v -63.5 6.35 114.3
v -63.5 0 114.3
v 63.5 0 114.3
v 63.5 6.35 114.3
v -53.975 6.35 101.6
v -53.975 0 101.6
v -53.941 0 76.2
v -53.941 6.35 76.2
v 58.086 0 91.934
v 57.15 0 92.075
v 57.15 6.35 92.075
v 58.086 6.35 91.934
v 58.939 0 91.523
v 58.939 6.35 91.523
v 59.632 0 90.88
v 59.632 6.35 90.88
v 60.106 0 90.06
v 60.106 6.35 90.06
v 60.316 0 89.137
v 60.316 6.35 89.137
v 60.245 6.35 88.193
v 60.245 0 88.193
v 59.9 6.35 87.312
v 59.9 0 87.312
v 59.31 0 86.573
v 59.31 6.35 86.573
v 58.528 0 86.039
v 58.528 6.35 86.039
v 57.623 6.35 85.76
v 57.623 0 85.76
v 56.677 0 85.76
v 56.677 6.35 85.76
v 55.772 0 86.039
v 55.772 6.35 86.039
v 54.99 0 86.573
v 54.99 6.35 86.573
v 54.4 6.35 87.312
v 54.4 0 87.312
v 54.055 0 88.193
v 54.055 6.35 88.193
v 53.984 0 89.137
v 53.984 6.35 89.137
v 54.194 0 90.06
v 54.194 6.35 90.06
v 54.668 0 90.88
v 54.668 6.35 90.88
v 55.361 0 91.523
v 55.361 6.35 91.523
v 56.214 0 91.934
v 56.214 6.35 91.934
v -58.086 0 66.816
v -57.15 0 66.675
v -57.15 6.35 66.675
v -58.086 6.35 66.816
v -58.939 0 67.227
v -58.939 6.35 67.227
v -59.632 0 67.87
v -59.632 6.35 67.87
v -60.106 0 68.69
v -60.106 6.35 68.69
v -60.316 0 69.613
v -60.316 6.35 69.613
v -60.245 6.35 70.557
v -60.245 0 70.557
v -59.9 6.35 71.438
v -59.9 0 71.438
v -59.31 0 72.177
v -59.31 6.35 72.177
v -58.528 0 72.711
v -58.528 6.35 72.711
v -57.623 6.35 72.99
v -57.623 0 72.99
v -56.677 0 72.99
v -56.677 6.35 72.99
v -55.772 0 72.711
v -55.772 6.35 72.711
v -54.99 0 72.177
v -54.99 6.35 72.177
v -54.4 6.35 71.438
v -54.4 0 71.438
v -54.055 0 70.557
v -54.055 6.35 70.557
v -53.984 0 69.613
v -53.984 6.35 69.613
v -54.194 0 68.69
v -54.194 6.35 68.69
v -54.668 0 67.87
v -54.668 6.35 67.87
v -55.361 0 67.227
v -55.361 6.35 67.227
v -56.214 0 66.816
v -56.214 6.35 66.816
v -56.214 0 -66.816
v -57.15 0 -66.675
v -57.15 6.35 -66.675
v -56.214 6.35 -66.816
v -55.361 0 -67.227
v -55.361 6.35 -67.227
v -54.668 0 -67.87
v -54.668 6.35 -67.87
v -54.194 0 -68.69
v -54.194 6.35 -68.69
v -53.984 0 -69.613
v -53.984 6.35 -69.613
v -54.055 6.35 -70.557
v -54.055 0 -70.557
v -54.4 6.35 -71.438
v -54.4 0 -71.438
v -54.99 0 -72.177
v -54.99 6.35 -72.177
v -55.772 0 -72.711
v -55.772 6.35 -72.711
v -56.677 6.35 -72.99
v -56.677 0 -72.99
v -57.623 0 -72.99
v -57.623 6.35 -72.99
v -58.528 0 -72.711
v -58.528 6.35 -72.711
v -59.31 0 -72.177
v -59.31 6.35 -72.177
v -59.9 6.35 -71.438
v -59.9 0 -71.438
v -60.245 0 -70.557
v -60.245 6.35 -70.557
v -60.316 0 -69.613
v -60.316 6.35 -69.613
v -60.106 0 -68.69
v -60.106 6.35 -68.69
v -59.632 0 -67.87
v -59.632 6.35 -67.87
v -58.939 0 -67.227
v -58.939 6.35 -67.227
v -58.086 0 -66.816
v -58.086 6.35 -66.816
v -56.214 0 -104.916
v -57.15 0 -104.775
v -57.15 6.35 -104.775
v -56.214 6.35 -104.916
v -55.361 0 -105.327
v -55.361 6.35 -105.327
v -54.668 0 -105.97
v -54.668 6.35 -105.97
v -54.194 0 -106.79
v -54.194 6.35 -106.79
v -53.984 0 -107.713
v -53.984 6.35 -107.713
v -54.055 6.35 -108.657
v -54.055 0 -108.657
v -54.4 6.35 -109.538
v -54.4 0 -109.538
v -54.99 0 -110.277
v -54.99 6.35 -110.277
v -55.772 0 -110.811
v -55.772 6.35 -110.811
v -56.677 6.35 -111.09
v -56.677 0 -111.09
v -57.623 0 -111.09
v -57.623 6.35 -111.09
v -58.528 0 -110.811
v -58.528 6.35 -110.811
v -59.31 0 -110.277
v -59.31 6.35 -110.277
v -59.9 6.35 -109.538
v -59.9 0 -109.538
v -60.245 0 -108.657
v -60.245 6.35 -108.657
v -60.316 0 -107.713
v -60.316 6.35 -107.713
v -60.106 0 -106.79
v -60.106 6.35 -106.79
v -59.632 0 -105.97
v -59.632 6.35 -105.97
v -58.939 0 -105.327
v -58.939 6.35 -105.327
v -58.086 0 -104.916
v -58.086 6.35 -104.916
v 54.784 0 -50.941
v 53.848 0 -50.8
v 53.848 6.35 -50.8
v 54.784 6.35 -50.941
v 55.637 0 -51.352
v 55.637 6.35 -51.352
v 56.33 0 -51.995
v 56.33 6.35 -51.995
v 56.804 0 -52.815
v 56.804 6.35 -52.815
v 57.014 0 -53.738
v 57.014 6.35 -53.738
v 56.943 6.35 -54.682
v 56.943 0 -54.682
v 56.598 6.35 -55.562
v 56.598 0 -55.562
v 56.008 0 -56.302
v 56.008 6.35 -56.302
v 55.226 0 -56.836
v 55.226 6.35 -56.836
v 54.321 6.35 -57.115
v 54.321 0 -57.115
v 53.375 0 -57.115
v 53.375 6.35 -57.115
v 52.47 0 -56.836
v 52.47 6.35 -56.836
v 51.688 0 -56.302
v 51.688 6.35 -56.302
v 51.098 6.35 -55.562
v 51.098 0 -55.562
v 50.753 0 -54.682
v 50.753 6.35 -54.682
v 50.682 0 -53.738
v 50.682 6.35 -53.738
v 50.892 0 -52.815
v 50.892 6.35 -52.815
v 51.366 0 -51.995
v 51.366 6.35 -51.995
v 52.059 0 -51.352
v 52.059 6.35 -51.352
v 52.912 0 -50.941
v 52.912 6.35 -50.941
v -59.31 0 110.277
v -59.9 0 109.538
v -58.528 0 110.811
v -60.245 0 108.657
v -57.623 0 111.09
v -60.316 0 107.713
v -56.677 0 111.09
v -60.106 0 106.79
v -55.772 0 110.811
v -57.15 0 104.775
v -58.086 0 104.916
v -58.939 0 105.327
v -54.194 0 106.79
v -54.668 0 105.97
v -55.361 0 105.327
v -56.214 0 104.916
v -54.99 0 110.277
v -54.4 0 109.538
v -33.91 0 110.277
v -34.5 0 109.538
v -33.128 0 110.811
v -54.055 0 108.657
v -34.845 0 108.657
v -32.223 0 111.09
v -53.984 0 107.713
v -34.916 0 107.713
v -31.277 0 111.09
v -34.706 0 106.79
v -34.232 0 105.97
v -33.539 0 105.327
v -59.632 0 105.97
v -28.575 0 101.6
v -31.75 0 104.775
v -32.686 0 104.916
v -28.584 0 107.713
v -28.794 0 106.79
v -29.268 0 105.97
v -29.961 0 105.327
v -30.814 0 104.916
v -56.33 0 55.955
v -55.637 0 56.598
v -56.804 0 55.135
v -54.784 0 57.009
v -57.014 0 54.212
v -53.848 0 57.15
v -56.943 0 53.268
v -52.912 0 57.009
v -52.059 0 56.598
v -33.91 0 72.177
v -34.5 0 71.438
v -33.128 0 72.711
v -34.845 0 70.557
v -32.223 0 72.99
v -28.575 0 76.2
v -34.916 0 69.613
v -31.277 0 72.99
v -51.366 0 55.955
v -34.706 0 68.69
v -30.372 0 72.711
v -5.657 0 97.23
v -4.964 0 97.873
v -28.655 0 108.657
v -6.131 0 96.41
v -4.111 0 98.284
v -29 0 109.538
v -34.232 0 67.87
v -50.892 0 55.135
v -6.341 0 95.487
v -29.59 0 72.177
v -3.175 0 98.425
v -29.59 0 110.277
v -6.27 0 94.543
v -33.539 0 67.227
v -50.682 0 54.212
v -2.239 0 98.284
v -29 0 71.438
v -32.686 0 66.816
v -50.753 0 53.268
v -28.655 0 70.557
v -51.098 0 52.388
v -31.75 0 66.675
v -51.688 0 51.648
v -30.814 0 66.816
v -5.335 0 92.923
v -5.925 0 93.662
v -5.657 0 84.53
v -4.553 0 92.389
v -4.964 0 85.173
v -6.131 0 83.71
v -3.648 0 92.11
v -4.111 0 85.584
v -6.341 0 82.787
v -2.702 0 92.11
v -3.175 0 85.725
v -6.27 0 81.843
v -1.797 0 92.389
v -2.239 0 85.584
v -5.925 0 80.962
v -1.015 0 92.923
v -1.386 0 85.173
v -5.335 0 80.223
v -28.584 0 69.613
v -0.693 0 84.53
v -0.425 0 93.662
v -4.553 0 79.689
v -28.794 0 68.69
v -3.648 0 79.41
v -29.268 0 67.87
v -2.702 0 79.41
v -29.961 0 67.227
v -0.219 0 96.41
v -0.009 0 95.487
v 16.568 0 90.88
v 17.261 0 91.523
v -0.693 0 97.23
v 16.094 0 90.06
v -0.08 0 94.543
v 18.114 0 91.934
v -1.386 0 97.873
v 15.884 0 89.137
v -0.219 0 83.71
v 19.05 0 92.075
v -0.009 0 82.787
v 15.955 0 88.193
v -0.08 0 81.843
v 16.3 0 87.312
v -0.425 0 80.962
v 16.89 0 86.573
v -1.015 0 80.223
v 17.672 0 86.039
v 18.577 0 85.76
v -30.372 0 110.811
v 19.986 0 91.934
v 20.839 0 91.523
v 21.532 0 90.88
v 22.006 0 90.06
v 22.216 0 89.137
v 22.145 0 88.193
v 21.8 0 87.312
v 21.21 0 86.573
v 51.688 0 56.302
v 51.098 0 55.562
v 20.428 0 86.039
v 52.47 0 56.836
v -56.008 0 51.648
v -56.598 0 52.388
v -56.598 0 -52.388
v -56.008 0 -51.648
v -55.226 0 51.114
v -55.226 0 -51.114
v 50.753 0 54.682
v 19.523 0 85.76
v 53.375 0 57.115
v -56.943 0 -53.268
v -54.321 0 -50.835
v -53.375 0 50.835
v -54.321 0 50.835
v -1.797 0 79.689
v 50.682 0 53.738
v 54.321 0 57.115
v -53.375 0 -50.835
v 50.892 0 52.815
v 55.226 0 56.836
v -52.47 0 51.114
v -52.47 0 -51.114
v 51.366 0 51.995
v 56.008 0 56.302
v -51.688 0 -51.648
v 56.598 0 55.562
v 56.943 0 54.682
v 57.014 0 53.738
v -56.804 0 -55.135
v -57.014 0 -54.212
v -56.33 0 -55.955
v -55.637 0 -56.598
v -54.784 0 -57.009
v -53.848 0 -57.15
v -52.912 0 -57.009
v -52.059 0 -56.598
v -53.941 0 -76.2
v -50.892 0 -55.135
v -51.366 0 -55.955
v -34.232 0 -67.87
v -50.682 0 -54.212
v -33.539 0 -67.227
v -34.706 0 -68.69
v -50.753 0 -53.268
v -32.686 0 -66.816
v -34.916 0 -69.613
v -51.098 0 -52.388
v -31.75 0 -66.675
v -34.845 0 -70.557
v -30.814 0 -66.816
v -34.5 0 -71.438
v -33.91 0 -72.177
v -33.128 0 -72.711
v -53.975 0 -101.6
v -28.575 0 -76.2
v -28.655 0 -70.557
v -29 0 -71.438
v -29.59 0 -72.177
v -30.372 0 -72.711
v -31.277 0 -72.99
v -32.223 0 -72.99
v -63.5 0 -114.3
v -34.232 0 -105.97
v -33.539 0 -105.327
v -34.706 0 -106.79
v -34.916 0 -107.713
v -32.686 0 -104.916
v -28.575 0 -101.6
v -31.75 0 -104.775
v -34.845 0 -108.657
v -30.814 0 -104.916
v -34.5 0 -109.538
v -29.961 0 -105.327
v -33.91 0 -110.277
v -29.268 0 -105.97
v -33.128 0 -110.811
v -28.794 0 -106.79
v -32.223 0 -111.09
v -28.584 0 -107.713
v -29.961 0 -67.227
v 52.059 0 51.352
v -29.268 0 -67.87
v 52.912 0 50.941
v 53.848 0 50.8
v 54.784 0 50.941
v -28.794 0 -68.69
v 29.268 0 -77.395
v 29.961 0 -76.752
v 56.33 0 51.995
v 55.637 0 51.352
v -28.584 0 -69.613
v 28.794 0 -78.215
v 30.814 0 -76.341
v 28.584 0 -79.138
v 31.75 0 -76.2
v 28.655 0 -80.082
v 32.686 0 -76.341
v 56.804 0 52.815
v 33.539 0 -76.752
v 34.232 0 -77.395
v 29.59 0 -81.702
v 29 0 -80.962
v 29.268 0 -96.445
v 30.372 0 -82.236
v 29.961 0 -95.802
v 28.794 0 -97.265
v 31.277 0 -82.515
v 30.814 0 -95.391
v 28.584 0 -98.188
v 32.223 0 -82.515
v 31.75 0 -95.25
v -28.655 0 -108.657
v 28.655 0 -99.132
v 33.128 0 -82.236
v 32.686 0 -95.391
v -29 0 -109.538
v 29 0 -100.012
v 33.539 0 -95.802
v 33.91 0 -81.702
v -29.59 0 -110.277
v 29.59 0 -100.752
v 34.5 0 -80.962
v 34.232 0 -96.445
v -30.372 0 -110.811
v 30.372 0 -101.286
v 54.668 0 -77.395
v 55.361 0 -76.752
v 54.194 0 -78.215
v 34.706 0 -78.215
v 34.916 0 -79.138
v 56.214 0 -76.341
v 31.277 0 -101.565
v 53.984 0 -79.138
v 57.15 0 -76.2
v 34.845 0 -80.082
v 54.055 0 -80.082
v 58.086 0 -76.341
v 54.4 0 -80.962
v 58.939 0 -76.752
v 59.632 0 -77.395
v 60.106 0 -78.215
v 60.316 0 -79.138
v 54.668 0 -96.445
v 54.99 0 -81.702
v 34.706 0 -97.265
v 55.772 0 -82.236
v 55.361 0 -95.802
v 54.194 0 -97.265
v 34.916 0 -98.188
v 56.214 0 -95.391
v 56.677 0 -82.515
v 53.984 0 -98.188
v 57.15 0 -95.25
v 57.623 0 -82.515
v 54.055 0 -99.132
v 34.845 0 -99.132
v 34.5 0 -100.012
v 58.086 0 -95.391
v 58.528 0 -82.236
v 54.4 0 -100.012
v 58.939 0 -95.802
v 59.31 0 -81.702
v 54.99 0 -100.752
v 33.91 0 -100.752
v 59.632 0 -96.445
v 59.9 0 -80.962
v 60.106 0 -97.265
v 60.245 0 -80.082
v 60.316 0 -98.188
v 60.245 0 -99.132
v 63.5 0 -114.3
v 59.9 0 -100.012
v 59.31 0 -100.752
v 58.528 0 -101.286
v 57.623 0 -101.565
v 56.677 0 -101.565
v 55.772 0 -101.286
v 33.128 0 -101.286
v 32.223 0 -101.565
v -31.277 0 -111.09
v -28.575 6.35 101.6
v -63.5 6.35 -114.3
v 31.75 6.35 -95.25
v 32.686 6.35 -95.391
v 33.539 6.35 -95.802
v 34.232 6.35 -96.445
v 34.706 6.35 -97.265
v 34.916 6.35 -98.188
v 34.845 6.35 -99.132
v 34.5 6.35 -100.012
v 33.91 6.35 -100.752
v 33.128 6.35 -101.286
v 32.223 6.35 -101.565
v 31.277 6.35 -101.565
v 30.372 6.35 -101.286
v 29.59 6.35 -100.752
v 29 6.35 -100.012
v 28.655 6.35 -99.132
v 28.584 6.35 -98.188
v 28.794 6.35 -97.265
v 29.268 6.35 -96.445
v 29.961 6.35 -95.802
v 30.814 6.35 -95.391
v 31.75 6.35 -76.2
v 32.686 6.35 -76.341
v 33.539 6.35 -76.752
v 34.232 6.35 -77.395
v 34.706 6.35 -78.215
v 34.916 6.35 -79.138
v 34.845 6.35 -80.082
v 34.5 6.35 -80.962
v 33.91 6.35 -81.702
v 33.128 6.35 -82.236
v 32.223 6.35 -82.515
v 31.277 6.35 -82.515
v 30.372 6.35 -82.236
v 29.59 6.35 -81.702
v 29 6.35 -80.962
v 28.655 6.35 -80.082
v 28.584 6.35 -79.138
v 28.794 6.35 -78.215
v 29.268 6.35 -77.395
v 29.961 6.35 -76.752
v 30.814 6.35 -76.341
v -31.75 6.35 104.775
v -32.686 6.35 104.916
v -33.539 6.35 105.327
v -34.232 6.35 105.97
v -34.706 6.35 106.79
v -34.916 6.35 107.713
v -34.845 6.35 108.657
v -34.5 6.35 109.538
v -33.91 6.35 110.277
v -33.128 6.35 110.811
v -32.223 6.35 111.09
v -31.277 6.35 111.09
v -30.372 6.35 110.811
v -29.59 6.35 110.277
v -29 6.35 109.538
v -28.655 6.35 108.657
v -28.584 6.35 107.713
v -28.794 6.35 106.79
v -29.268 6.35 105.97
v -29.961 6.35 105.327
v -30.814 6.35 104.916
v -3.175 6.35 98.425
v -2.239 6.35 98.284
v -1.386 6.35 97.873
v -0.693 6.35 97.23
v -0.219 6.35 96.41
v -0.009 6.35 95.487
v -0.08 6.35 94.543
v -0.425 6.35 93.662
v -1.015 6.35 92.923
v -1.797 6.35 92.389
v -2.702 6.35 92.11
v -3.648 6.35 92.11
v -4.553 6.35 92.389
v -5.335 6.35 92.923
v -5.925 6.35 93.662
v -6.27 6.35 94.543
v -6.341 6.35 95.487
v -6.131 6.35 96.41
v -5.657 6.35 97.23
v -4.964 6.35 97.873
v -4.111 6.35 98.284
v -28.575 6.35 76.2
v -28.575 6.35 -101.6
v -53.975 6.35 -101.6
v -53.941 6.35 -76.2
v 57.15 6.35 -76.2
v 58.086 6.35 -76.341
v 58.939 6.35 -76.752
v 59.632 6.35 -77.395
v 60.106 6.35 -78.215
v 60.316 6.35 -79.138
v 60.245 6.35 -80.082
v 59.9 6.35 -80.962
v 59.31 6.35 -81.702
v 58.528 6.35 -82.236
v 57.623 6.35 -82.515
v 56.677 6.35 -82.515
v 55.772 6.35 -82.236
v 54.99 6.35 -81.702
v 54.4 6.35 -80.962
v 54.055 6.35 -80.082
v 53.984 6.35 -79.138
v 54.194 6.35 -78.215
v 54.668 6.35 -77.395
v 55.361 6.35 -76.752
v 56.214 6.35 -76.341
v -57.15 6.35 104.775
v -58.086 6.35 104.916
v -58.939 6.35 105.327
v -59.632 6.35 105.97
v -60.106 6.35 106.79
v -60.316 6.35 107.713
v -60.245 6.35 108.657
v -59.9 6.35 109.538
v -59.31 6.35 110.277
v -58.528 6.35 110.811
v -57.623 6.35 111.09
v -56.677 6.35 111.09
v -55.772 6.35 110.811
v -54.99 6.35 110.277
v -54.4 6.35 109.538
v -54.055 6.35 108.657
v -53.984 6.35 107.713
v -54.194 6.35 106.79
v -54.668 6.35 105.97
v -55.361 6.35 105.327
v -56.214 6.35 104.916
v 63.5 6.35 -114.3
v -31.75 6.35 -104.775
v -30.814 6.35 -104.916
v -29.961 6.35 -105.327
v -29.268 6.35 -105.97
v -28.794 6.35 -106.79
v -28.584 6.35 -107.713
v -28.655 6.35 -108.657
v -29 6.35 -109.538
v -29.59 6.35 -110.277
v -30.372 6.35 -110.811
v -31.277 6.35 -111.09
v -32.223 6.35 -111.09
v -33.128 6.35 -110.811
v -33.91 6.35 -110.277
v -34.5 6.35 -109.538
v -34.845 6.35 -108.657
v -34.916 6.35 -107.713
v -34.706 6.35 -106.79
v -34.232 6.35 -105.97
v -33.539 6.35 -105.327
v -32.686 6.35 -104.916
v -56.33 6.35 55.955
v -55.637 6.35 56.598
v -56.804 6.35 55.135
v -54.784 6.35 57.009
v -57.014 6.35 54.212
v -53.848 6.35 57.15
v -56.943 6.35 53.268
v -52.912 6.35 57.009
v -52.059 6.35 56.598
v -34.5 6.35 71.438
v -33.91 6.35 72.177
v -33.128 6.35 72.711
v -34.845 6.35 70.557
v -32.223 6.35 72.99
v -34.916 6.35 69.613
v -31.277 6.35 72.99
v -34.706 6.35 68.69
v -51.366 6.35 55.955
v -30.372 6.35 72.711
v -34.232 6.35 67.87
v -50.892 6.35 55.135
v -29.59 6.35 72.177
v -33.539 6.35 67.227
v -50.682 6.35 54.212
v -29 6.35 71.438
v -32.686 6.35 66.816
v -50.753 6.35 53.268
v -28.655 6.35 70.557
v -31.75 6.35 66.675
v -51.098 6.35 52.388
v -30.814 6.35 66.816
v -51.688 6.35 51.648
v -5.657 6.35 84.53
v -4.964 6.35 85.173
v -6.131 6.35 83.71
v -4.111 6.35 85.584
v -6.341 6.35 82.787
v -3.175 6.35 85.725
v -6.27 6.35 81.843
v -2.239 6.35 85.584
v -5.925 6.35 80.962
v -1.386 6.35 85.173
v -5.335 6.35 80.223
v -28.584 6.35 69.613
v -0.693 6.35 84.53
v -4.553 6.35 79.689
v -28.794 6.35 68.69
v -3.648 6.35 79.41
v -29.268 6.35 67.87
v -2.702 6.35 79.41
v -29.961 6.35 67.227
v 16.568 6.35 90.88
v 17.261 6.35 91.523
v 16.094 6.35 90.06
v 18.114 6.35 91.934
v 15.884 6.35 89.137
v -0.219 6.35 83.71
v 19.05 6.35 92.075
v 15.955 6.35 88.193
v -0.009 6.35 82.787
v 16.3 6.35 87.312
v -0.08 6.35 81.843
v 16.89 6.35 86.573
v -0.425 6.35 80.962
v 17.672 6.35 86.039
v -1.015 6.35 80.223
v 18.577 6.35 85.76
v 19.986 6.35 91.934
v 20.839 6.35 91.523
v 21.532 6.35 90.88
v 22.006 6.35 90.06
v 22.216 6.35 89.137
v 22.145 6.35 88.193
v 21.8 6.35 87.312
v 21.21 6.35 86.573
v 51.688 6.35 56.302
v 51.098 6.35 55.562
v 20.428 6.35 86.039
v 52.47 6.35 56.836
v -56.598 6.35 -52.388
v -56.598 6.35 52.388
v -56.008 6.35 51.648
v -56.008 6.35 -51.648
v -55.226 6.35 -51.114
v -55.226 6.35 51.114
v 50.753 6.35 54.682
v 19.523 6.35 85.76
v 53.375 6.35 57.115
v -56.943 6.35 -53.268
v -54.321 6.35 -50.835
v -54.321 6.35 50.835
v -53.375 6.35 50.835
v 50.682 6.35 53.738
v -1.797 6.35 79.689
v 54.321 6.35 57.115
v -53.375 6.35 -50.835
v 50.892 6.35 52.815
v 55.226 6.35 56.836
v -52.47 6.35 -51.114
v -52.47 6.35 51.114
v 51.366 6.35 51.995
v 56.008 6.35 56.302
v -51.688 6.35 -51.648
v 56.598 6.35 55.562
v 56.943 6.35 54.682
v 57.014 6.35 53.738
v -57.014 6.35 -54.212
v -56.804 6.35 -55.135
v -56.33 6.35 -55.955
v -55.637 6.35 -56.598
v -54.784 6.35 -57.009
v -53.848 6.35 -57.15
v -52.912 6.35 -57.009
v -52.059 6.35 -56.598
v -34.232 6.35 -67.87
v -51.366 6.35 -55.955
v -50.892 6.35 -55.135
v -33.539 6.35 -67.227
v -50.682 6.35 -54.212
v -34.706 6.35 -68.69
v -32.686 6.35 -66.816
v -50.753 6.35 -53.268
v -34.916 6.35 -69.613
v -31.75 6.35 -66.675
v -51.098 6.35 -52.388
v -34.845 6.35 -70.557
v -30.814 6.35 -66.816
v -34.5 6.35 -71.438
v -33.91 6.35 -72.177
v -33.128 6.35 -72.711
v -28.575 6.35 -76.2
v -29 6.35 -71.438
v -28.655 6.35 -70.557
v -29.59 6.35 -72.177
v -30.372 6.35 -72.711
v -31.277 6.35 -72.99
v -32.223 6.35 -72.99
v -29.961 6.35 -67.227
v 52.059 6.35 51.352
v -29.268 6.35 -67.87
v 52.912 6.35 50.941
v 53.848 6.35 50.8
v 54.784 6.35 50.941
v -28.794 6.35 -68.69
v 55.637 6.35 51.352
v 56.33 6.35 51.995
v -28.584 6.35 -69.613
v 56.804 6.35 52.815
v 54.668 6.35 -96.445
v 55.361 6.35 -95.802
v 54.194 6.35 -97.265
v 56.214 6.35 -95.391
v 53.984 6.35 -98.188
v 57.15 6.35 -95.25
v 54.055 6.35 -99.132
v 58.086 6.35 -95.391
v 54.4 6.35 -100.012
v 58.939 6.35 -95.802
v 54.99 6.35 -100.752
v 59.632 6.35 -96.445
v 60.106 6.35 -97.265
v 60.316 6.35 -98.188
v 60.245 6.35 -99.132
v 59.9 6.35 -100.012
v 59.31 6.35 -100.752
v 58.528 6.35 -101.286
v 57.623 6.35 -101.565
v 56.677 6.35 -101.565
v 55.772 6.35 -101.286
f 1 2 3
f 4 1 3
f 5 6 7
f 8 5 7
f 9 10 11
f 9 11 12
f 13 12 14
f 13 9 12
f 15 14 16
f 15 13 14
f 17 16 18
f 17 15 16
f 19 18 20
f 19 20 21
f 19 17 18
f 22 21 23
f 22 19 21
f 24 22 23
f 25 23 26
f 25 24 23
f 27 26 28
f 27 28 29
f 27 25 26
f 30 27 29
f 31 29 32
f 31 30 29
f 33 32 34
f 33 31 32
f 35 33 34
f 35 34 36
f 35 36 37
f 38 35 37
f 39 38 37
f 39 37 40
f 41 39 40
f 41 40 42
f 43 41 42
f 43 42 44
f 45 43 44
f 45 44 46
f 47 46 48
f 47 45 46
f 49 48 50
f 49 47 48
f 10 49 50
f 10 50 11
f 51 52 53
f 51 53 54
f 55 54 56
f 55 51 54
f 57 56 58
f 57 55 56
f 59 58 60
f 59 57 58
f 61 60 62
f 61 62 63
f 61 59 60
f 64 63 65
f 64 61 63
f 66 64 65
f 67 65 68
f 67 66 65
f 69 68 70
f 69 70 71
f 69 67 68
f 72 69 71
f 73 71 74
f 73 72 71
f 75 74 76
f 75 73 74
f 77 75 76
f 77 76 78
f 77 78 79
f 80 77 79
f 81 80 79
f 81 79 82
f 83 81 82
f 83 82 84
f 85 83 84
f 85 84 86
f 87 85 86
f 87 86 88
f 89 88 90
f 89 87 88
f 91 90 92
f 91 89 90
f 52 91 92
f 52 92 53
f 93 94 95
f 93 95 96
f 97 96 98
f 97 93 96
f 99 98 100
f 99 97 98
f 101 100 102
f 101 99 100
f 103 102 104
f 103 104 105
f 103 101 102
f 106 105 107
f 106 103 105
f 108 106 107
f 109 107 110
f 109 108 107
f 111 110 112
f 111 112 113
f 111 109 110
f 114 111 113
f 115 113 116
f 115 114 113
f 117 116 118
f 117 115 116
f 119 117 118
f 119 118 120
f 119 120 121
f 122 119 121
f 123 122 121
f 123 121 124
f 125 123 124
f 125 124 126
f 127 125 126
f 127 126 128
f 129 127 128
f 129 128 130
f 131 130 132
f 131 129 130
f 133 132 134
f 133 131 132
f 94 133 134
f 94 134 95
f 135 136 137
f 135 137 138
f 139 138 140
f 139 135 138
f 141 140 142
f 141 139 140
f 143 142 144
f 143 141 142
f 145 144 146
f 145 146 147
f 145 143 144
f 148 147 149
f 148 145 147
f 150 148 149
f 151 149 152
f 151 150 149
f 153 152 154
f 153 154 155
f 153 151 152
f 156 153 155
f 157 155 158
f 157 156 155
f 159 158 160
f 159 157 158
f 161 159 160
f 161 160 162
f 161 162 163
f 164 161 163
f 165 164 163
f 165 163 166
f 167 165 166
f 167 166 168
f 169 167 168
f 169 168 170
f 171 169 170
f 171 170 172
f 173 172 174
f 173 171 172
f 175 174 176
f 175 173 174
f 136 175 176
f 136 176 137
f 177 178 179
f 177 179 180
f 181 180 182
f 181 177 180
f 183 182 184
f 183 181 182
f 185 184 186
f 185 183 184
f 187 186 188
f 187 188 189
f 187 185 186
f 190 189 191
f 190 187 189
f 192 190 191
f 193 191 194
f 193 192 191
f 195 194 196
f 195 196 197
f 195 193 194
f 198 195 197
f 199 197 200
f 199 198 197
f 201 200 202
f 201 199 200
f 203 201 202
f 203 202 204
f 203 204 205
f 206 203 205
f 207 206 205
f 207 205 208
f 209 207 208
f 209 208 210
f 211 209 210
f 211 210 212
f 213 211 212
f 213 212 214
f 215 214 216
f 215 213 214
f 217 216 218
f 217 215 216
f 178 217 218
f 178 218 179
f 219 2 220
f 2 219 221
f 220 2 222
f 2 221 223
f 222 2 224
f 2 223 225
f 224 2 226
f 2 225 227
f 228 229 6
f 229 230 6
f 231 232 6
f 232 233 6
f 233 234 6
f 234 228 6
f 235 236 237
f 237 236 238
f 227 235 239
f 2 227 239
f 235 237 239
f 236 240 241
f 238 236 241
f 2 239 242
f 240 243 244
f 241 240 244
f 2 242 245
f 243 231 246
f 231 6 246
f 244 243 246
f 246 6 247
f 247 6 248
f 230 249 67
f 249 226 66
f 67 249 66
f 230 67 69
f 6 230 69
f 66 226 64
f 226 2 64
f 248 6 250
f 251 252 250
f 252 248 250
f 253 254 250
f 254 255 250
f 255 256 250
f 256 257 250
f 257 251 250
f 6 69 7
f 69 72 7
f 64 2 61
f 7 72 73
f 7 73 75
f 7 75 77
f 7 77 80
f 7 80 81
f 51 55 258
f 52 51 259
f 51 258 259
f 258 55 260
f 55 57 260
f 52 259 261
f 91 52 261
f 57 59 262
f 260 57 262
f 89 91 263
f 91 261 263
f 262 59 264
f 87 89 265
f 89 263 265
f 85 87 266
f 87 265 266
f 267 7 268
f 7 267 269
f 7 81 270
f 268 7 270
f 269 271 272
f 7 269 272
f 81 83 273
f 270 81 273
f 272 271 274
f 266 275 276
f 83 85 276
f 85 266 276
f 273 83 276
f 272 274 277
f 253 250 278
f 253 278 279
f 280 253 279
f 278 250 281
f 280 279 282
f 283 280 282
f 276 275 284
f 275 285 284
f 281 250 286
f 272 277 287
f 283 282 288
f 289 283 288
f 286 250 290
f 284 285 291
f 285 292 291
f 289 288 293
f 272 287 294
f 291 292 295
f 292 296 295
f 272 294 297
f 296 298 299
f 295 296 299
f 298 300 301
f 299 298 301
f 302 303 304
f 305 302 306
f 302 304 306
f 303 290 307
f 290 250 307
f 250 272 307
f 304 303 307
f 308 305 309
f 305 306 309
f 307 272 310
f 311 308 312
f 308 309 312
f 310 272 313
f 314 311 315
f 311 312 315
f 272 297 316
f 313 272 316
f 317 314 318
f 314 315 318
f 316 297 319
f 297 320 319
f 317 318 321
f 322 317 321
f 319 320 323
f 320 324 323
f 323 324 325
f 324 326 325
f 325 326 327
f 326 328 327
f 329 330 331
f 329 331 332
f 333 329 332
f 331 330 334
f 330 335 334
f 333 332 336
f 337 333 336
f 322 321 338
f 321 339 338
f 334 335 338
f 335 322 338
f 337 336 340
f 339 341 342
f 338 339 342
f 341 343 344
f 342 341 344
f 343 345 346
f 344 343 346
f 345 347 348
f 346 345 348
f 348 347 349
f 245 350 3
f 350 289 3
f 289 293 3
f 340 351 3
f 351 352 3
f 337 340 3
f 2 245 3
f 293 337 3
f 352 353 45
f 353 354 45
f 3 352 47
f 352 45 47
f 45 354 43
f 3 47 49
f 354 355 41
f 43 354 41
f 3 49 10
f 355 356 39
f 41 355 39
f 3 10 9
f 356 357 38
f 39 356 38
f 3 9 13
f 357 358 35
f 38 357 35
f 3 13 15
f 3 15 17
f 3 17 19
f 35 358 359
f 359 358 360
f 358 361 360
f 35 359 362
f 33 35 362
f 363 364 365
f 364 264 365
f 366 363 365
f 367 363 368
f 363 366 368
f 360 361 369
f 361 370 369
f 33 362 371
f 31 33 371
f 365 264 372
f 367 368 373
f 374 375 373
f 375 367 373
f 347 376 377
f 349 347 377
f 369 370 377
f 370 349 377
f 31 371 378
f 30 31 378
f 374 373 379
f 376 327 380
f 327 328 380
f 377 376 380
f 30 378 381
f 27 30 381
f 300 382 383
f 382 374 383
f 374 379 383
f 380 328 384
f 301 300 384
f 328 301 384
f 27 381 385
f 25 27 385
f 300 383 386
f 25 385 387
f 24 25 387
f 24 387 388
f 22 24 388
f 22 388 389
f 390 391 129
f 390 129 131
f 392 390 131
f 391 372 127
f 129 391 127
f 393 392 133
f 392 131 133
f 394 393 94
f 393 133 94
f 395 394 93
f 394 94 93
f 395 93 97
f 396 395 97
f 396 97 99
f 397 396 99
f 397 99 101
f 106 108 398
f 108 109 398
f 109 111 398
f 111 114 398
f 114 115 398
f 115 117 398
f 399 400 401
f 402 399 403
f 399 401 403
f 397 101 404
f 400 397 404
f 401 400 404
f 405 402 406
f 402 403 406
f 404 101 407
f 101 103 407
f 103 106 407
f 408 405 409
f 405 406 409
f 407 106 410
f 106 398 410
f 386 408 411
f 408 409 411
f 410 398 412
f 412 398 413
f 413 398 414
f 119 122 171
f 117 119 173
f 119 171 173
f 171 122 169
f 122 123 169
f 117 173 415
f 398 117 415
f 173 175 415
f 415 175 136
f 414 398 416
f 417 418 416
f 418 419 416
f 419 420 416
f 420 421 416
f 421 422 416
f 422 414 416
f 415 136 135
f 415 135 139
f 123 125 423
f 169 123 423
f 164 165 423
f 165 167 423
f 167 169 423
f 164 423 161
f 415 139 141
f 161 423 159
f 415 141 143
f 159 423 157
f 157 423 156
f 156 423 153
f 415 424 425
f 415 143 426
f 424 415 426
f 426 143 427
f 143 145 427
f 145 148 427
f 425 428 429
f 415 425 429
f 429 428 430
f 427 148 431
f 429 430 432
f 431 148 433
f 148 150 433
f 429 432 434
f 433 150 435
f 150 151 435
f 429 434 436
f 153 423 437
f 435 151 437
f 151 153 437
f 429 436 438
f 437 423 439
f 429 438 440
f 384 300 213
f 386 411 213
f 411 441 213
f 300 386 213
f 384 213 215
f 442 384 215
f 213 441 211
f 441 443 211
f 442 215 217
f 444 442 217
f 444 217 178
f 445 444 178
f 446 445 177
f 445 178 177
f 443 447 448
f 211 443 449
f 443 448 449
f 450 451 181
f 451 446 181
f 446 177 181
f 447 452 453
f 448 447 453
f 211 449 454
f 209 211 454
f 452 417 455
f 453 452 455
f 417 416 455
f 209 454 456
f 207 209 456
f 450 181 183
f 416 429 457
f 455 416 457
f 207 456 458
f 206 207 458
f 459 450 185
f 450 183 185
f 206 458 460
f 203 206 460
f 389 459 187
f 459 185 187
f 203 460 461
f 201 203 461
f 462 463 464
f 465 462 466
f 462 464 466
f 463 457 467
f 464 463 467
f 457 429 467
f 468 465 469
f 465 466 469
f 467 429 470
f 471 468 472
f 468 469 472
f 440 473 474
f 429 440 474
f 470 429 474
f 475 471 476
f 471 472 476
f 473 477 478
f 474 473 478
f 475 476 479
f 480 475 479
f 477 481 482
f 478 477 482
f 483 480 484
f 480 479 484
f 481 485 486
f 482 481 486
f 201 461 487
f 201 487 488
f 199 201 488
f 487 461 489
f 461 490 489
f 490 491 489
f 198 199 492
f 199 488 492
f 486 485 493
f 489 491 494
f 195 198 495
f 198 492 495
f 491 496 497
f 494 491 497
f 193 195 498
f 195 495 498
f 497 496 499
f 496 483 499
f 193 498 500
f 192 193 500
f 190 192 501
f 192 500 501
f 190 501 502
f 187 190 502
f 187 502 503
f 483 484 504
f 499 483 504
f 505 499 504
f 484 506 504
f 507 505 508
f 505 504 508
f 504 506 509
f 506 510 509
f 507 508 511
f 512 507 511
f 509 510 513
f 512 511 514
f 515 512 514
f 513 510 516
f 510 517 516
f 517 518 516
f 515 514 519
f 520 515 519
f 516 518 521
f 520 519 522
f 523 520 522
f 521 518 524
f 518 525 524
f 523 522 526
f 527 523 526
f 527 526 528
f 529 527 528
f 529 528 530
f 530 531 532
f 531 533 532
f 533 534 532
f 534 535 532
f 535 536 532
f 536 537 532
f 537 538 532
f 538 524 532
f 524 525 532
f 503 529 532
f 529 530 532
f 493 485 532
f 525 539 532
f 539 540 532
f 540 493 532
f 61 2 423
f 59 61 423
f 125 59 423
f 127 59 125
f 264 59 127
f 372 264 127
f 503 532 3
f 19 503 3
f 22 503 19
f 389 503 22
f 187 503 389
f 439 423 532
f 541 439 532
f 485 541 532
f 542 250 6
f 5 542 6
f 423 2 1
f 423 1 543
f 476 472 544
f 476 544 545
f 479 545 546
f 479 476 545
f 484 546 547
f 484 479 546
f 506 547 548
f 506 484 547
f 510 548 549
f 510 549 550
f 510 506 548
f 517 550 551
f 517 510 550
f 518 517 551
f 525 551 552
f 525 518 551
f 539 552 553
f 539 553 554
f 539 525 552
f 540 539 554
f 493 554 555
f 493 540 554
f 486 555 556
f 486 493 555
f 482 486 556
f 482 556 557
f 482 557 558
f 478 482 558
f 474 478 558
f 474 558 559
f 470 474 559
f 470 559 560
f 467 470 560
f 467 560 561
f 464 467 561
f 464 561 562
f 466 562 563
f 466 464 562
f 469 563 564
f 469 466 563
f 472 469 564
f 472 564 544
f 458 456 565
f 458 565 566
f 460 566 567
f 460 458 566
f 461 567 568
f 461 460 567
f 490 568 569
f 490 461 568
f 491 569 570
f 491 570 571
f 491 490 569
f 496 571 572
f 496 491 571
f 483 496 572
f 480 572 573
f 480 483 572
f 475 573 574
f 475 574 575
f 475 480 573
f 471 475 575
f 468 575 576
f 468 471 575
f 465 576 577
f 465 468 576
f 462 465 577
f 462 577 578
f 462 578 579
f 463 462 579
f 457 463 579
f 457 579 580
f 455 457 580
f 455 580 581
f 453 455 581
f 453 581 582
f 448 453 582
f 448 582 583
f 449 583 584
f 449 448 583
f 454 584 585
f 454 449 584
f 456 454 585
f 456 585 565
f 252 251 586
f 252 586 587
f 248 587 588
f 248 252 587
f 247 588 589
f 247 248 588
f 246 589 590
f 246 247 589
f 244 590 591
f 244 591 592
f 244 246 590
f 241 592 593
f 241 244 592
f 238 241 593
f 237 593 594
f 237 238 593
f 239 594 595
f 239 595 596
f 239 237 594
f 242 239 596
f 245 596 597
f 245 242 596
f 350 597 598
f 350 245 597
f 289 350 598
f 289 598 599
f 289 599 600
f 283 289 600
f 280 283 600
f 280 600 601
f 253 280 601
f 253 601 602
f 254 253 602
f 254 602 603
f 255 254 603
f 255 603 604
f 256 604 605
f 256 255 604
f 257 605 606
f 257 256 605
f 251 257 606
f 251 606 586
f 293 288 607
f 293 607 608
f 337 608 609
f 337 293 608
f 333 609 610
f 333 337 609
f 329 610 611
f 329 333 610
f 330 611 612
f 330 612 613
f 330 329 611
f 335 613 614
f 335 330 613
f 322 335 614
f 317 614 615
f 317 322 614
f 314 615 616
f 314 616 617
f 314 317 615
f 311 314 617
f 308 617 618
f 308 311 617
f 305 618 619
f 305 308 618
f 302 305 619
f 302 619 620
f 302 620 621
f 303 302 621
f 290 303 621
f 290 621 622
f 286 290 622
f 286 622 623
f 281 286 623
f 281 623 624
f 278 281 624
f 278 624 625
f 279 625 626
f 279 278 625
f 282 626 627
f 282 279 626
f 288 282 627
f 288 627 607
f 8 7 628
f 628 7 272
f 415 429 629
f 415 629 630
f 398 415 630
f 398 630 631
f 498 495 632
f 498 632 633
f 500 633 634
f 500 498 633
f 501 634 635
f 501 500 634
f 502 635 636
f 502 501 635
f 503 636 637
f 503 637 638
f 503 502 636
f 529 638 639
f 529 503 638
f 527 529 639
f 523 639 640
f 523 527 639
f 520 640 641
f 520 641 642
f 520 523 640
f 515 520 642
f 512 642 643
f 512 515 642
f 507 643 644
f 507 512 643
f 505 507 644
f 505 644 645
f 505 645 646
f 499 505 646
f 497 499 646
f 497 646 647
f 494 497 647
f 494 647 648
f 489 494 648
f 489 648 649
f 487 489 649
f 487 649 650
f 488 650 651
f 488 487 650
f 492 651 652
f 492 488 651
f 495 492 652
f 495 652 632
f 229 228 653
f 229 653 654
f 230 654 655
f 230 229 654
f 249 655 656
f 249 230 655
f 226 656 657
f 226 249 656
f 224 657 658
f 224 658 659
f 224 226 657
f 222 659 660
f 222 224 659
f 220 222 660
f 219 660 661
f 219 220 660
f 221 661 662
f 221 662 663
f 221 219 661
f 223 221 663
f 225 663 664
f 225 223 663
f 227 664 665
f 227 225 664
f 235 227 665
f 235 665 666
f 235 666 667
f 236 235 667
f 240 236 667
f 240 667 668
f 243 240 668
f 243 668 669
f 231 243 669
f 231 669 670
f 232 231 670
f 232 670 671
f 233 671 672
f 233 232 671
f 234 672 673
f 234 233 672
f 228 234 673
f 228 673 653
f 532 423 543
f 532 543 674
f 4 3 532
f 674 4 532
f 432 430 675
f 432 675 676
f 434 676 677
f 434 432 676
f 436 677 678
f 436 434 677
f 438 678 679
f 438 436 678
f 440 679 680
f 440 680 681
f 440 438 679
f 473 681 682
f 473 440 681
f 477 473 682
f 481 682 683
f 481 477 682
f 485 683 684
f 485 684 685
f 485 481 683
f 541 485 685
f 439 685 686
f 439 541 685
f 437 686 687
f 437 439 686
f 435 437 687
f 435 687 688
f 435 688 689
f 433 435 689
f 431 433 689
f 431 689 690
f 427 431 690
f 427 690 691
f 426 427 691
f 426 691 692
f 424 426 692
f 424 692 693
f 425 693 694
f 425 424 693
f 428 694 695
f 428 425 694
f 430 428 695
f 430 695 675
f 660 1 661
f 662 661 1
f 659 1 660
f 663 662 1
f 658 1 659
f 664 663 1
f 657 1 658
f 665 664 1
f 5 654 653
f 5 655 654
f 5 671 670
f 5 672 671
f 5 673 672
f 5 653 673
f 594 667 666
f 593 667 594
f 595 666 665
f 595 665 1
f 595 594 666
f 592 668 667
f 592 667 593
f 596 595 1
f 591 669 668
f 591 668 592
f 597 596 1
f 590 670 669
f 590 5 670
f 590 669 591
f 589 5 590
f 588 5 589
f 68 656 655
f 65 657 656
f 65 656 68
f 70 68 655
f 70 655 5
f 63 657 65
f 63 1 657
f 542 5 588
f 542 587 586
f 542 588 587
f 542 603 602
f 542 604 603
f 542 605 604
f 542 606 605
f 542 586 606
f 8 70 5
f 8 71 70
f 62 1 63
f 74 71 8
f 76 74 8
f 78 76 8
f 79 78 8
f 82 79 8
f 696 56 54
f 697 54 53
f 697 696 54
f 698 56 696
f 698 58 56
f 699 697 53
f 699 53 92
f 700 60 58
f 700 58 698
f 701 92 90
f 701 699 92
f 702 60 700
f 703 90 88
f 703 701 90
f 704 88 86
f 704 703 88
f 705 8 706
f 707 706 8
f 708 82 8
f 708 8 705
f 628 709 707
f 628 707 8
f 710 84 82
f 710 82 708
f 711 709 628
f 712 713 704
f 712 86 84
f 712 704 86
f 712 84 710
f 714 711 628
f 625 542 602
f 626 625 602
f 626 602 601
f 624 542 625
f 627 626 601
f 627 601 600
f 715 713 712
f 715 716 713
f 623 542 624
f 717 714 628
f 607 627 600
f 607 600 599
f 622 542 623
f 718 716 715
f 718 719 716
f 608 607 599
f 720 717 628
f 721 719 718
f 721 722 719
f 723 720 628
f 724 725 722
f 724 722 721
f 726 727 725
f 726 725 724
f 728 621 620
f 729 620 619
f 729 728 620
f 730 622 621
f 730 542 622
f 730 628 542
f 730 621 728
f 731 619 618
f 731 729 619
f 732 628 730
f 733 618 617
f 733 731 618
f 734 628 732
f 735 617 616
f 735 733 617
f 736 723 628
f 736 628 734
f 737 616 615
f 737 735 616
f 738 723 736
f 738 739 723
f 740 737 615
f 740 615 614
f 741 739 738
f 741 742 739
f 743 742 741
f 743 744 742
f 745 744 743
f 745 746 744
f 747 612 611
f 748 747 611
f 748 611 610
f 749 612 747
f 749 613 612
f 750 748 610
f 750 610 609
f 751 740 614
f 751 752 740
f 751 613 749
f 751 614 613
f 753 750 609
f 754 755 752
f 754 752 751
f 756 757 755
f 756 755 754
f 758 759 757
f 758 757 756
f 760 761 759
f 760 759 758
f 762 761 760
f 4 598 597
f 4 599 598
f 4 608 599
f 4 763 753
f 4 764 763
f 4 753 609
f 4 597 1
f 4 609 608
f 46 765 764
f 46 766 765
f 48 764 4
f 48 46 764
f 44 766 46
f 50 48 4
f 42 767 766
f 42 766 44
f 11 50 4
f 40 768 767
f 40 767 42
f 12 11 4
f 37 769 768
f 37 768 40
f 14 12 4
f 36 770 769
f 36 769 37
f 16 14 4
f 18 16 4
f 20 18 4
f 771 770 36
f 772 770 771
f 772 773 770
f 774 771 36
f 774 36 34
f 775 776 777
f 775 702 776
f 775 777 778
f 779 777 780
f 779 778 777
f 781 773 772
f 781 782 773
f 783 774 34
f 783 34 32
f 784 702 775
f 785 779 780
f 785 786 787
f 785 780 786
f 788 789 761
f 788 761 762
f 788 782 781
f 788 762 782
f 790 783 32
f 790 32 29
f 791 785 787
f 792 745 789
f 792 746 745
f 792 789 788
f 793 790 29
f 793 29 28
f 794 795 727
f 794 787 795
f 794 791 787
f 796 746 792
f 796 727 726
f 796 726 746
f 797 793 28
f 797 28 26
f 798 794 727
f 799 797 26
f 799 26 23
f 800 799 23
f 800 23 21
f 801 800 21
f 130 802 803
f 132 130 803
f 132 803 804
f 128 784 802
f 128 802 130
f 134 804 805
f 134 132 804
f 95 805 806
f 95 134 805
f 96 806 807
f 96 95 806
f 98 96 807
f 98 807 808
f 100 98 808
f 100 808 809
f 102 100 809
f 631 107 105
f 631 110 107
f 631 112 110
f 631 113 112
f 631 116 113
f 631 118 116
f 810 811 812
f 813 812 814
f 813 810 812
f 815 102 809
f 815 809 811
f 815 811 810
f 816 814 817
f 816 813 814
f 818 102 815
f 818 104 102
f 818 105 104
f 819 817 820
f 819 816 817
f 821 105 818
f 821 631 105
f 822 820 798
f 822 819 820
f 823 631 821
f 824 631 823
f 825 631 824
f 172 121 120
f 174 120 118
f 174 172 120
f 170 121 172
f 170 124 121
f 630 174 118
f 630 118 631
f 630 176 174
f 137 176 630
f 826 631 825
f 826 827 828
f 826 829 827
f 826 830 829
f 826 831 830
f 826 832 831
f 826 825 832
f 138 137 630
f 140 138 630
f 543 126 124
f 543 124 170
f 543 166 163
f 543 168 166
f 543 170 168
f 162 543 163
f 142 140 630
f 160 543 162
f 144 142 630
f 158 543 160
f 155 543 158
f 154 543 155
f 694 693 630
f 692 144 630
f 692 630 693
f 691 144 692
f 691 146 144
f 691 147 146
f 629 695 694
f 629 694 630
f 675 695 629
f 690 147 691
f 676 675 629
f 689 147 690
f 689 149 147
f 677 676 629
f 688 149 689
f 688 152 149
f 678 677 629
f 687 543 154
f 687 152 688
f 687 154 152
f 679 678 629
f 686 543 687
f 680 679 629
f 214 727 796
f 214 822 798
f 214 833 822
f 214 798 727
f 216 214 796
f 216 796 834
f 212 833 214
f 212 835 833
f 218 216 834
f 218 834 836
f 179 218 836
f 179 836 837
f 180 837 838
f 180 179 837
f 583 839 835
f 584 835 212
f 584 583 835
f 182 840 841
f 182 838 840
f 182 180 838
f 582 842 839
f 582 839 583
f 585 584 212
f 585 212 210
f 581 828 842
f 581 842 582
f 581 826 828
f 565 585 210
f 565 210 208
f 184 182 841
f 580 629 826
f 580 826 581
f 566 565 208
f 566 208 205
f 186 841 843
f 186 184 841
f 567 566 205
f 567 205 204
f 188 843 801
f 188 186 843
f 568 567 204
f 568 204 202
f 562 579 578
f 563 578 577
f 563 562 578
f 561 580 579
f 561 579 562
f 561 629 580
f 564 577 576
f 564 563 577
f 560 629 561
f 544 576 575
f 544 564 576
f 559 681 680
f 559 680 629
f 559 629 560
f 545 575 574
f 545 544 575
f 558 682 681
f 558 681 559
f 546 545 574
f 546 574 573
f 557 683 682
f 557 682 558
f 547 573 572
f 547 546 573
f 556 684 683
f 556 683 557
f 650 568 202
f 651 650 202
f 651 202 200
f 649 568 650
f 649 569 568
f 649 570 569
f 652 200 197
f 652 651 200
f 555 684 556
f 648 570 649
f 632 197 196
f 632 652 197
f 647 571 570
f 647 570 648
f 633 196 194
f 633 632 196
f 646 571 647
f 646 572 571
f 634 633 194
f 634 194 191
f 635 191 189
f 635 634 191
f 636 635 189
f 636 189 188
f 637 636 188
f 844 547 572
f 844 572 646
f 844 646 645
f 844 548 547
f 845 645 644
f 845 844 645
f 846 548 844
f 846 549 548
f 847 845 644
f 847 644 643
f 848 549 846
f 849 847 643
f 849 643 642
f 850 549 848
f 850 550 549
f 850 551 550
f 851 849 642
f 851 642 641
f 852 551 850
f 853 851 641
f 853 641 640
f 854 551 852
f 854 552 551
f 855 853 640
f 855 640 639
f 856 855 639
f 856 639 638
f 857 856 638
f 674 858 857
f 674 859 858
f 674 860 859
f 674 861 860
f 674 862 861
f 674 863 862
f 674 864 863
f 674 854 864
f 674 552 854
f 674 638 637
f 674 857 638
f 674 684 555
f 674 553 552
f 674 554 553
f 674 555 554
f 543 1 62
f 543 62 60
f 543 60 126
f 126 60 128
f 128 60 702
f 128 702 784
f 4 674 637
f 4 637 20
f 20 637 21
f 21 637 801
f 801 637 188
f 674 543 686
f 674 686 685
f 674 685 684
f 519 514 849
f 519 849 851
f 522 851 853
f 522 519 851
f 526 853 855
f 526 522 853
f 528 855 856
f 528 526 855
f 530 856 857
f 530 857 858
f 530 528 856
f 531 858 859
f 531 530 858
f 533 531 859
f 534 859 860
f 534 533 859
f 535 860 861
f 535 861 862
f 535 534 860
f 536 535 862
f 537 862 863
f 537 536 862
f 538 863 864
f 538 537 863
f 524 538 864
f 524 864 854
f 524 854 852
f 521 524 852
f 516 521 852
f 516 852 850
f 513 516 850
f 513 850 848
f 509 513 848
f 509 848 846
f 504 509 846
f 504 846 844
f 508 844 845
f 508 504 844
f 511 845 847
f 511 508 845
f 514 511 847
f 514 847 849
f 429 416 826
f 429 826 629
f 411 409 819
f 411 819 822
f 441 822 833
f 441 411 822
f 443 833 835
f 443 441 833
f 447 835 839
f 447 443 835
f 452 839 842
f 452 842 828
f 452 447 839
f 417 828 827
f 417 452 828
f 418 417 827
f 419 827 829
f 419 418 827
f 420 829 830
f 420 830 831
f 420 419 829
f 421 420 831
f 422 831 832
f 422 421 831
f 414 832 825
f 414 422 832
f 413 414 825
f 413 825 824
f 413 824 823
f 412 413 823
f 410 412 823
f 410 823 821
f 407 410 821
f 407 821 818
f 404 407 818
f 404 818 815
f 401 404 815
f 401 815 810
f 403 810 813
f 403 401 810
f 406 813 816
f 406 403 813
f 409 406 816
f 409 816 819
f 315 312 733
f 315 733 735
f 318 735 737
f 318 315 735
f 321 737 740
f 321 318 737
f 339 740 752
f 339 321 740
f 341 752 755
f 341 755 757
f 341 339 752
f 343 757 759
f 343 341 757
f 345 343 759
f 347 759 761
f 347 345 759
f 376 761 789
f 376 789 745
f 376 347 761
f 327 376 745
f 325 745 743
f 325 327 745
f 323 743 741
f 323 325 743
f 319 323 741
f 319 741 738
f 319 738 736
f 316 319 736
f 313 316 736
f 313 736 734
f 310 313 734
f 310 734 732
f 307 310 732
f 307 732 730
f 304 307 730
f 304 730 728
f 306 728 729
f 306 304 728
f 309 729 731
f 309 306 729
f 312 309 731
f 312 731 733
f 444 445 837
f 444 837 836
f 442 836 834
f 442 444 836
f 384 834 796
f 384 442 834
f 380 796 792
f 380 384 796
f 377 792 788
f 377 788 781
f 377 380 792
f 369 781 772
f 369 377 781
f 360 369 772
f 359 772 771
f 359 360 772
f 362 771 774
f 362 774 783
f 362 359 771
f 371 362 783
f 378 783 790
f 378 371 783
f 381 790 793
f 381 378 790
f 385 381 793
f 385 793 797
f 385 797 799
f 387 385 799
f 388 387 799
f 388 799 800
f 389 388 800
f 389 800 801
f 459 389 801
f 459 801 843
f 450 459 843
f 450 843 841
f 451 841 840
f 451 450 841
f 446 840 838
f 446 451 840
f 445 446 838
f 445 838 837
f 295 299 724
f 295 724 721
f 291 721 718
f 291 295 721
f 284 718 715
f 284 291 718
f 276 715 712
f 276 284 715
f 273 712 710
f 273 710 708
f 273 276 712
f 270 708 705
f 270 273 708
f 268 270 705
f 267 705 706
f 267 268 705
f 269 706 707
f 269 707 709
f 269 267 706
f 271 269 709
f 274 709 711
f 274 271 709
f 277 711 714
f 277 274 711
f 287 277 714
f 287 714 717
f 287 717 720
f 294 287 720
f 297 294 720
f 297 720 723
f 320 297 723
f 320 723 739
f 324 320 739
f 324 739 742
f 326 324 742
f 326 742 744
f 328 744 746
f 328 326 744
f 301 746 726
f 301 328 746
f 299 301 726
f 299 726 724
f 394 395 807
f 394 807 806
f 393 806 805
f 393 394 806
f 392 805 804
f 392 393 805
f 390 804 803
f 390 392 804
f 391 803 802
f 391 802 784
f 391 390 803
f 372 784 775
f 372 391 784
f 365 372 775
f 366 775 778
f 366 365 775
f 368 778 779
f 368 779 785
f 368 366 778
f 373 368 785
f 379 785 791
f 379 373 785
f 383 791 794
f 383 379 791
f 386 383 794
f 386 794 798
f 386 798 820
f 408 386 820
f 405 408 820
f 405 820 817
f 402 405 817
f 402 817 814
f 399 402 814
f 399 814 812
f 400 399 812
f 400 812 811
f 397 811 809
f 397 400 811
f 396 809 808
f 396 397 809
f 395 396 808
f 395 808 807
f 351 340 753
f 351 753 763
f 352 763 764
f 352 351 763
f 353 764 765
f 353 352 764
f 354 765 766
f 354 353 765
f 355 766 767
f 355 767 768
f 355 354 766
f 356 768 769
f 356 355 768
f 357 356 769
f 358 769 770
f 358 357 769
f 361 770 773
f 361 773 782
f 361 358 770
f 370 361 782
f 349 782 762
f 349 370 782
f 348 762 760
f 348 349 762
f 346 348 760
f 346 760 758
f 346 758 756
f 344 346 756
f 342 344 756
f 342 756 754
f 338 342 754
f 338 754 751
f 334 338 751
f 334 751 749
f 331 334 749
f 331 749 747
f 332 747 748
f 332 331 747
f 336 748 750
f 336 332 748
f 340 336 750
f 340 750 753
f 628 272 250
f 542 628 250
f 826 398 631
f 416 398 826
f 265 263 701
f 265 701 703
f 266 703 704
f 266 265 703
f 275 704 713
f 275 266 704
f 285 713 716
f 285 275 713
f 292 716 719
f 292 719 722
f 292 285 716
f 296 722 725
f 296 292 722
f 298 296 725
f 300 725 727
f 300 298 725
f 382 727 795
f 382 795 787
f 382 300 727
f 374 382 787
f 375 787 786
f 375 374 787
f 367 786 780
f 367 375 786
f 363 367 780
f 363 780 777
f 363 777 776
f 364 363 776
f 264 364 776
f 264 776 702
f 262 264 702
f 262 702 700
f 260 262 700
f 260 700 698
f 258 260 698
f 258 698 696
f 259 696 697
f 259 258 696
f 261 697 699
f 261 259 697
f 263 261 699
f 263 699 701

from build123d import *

# Parameters (mm, degrees)
SKETCH1_W           = 127
SKETCH1_H           = 228.6
SKETCH1_R           = 3.175
BOSS_EXTRUDE1_DEPTH = 6.35


with BuildPart() as part:
    # Sketch1 → Boss-Extrude1 (new body)
    with BuildSketch(Plane(origin=(0, 0, 0), x_dir=(1, 0, 0), z_dir=(0, 1, 0))):
        Rectangle(SKETCH1_W, SKETCH1_H)
        with Locations(Location((-57.15, 107.95, 0), (0, 0, 270))):
            Circle(SKETCH1_R, mode=Mode.SUBTRACT)
        with Locations(Location((-57.15, 69.85, 0), (0, 0, 270))):
            Circle(SKETCH1_R, mode=Mode.SUBTRACT)
        with Locations(Location((-31.75, 107.95, 0), (0, 0, 270))):
            Circle(SKETCH1_R, mode=Mode.SUBTRACT)
        with Locations(Location((-31.75, 69.85, 0), (0, 0, 270))):
            Circle(SKETCH1_R, mode=Mode.SUBTRACT)
        with Locations(Location((-31.75, -69.85, 0), (0, 0, 90))):
            Circle(SKETCH1_R, mode=Mode.SUBTRACT)
        with Locations(Location((-57.15, -69.85, 0), (0, 0, 90))):
            Circle(SKETCH1_R, mode=Mode.SUBTRACT)
        with Locations(Location((-31.75, -107.95, 0), (0, 0, 90))):
            Circle(SKETCH1_R, mode=Mode.SUBTRACT)
        with Locations(Location((-57.15, -107.95, 0), (0, 0, 90))):
            Circle(SKETCH1_R, mode=Mode.SUBTRACT)
        with Locations(Location((57.15, 98.425, 0), (0, 0, 270))):
            Circle(SKETCH1_R, mode=Mode.SUBTRACT)
        with Locations(Location((31.75, 98.425, 0), (0, 0, 270))):
            Circle(SKETCH1_R, mode=Mode.SUBTRACT)
        with Locations(Location((57.15, 79.375, 0), (0, 0, 270))):
            Circle(SKETCH1_R, mode=Mode.SUBTRACT)
        with Locations(Location((31.75, 79.375, 0), (0, 0, 270))):
            Circle(SKETCH1_R, mode=Mode.SUBTRACT)
        with Locations(Location((57.15, -88.9, 0), (0, 0, 270))):
            Circle(SKETCH1_R, mode=Mode.SUBTRACT)
        with Locations(Location((19.05, -88.9, 0), (0, 0, 270))):
            Circle(SKETCH1_R, mode=Mode.SUBTRACT)
        with Locations(Location((-53.848, -53.975, 0), (0, 0, 270))):
            Circle(SKETCH1_R, mode=Mode.SUBTRACT)
        with Locations(Location((-53.848, 53.975, 0), (0, 0, 90))):
            Circle(SKETCH1_R, mode=Mode.SUBTRACT)
        with Locations(Location((53.848, -53.975, 0), (0, 0, 90))):
            Circle(SKETCH1_R, mode=Mode.SUBTRACT)
        with Locations(Location((53.848, 53.975, 0), (0, 0, 270))):
            Circle(SKETCH1_R, mode=Mode.SUBTRACT)
        with Locations(Location((-3.175, -82.55, 0), (0, 0, 270))):
            Circle(SKETCH1_R, mode=Mode.SUBTRACT)
        with Locations(Location((-3.175, -95.25, 0), (0, 0, 270))):
            Circle(SKETCH1_R, mode=Mode.SUBTRACT)
        Polygon((-53.975, -101.599988436), (-53.940723216, -76.200011564), (-28.575, -76.200011564), (-28.575, -101.599988436), align=None, mode=Mode.SUBTRACT)
        Polygon((-53.975, 101.599988436), (-53.940723216, 76.200011564), (-28.575, 76.200011564), (-28.575, 101.599988436), align=None, mode=Mode.SUBTRACT)
    extrude(amount=BOSS_EXTRUDE1_DEPTH)


solid = part.part
